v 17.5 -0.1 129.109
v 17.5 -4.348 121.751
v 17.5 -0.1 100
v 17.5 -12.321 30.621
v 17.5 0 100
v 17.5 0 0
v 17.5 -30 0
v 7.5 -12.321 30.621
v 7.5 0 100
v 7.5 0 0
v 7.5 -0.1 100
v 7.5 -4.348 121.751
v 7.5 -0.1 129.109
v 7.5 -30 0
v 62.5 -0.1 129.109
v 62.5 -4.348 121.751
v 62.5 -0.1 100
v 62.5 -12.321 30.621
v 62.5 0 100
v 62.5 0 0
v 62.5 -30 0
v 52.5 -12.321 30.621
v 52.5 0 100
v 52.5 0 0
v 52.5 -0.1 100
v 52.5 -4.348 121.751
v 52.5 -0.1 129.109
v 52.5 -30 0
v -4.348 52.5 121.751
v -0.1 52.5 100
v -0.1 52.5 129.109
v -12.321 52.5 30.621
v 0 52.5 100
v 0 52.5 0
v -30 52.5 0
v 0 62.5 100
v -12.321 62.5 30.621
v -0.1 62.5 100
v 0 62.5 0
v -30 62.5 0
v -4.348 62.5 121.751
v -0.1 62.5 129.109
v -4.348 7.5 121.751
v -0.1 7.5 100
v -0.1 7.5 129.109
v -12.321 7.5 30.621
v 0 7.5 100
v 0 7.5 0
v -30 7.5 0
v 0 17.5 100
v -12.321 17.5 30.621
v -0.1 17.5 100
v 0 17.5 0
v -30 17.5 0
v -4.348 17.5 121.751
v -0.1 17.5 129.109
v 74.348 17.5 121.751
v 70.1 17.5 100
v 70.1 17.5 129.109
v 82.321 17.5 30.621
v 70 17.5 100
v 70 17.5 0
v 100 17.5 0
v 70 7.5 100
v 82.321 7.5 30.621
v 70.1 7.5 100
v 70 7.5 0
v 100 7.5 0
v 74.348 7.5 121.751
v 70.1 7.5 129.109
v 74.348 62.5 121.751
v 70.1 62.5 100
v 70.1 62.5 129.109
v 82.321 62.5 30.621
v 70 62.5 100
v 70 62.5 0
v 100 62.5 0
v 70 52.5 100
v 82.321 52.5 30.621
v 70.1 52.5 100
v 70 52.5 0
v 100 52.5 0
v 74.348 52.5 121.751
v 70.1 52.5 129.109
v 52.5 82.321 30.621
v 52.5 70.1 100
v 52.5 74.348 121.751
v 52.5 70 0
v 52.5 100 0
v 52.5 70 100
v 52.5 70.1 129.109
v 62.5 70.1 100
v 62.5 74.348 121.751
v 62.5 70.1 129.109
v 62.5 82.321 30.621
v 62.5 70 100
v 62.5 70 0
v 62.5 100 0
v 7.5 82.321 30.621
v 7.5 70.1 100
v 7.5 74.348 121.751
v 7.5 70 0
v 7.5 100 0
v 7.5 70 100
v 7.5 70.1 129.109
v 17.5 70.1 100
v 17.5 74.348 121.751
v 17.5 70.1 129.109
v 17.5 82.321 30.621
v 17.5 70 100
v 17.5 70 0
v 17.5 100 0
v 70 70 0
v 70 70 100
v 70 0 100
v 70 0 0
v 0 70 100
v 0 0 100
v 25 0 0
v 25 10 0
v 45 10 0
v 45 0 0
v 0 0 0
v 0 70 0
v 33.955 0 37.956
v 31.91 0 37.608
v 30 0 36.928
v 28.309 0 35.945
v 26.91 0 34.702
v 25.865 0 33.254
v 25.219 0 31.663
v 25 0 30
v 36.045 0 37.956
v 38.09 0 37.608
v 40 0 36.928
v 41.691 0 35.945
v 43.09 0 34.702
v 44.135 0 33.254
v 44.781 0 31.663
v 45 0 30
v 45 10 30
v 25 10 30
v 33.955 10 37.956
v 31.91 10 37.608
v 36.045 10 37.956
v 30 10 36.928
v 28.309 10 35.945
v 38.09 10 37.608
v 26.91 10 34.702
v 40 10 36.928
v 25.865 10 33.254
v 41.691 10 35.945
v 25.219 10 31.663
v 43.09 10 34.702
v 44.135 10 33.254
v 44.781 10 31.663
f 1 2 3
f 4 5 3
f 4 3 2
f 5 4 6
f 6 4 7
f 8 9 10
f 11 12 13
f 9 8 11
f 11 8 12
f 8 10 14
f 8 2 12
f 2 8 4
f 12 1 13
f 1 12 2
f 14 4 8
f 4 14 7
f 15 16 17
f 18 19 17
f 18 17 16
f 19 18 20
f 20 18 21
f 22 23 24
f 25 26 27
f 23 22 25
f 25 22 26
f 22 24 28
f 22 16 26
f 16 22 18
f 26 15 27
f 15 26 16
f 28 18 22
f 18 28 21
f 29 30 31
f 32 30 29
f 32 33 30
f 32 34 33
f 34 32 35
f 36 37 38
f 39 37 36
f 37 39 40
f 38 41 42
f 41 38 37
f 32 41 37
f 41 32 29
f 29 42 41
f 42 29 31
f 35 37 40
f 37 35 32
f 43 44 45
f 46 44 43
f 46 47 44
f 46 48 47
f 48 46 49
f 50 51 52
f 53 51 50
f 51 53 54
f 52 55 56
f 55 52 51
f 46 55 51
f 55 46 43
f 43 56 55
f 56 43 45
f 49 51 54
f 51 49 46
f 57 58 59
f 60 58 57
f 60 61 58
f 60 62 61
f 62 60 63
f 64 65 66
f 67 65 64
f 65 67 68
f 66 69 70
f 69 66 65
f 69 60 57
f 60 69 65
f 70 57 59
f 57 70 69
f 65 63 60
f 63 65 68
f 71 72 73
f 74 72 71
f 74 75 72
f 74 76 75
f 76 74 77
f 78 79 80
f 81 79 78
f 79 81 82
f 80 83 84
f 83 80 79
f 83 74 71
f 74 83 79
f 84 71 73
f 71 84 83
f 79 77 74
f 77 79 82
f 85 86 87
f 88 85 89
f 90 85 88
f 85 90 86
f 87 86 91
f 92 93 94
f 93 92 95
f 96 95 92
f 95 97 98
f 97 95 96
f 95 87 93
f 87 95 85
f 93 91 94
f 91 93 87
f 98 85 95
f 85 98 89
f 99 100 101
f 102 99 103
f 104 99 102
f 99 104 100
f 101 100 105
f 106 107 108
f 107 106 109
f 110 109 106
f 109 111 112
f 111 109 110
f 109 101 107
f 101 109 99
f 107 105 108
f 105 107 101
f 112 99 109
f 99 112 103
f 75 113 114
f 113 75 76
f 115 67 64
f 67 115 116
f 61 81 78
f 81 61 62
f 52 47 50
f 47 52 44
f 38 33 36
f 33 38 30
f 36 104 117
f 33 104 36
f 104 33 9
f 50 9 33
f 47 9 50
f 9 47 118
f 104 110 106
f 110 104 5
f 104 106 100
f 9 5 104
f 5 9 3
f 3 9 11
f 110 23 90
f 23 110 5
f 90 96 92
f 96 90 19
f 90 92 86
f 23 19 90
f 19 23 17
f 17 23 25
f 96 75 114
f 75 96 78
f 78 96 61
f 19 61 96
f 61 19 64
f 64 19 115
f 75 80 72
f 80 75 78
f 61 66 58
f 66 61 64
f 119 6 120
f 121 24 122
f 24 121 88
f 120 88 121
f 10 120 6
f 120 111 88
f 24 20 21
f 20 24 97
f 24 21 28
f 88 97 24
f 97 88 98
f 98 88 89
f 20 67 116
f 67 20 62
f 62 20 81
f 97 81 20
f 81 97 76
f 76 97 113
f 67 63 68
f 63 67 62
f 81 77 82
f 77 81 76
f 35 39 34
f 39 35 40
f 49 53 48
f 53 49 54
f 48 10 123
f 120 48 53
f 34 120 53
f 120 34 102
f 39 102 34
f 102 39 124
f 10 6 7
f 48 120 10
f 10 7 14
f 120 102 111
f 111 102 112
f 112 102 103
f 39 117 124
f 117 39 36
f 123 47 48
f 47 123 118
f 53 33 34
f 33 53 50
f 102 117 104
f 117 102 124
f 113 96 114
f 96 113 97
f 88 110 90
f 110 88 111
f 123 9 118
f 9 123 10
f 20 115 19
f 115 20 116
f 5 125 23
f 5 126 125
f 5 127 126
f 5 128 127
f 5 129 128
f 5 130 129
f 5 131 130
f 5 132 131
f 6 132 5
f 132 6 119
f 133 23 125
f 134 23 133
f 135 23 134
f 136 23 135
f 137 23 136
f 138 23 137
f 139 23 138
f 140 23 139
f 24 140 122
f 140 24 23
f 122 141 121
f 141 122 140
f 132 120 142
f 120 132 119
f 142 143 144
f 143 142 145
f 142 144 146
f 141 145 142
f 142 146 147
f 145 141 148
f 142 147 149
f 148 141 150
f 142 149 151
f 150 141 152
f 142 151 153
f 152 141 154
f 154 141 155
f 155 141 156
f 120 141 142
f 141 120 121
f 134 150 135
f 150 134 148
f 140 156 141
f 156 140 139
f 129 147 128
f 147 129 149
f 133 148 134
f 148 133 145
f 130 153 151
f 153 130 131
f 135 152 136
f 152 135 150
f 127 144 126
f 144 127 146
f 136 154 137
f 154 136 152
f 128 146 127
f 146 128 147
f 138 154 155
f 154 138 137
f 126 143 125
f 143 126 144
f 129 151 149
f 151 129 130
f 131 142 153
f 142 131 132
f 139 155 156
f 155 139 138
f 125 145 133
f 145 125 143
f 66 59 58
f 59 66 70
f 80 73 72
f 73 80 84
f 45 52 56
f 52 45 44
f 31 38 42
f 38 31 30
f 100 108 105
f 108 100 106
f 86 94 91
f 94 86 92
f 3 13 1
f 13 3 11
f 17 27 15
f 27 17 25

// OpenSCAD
difference(){
    union(){
        cube([70,70,100]);

        translate([7.5,0,0]) foot();
        translate([70-7.5-10,0,0]) foot();
        
        translate([0,70,0])
        rotate([0,0,-90]){
            translate([7.5,0,0]) foot();
            translate([70-7.5-10,0,0]) foot();            
        }
        
        translate([70,0,0])
        rotate([0,0,90]){
            translate([7.5,0,0]) foot();
            translate([70-7.5-10,0,0]) foot();     
        }
        
        translate([70,70,0])
        rotate([0,0,180]){
            translate([7.5,0,0]) foot();
            translate([70-7.5-10,0,0]) foot();     
    
    }
        
    }
    translate([-0.1,-0.1,100])cube([70.2,70.2,100]);
    translate([-50,-50,-200])cube([200,200,200]);
    
    translate([70/2-10,0,0]){
        cube([20,10,30]);
        translate([10,0,30])scale([1,1,0.8])rotate([-90,0,0])cylinder(10,d=20);
    }
    
}

module foot(){
    difference(){
        translate([0,-15,0])
        rotate([-5,0,0])
        cube([10,20,150]);
        
        
        #translate([0,-40,100])
        rotate([-30,0,0])
        cube([10,20,150]);
        
        }


    translate([0,-30,0])
    rotate([-30,0,0])
    cube([10,20,50]);    
 }
